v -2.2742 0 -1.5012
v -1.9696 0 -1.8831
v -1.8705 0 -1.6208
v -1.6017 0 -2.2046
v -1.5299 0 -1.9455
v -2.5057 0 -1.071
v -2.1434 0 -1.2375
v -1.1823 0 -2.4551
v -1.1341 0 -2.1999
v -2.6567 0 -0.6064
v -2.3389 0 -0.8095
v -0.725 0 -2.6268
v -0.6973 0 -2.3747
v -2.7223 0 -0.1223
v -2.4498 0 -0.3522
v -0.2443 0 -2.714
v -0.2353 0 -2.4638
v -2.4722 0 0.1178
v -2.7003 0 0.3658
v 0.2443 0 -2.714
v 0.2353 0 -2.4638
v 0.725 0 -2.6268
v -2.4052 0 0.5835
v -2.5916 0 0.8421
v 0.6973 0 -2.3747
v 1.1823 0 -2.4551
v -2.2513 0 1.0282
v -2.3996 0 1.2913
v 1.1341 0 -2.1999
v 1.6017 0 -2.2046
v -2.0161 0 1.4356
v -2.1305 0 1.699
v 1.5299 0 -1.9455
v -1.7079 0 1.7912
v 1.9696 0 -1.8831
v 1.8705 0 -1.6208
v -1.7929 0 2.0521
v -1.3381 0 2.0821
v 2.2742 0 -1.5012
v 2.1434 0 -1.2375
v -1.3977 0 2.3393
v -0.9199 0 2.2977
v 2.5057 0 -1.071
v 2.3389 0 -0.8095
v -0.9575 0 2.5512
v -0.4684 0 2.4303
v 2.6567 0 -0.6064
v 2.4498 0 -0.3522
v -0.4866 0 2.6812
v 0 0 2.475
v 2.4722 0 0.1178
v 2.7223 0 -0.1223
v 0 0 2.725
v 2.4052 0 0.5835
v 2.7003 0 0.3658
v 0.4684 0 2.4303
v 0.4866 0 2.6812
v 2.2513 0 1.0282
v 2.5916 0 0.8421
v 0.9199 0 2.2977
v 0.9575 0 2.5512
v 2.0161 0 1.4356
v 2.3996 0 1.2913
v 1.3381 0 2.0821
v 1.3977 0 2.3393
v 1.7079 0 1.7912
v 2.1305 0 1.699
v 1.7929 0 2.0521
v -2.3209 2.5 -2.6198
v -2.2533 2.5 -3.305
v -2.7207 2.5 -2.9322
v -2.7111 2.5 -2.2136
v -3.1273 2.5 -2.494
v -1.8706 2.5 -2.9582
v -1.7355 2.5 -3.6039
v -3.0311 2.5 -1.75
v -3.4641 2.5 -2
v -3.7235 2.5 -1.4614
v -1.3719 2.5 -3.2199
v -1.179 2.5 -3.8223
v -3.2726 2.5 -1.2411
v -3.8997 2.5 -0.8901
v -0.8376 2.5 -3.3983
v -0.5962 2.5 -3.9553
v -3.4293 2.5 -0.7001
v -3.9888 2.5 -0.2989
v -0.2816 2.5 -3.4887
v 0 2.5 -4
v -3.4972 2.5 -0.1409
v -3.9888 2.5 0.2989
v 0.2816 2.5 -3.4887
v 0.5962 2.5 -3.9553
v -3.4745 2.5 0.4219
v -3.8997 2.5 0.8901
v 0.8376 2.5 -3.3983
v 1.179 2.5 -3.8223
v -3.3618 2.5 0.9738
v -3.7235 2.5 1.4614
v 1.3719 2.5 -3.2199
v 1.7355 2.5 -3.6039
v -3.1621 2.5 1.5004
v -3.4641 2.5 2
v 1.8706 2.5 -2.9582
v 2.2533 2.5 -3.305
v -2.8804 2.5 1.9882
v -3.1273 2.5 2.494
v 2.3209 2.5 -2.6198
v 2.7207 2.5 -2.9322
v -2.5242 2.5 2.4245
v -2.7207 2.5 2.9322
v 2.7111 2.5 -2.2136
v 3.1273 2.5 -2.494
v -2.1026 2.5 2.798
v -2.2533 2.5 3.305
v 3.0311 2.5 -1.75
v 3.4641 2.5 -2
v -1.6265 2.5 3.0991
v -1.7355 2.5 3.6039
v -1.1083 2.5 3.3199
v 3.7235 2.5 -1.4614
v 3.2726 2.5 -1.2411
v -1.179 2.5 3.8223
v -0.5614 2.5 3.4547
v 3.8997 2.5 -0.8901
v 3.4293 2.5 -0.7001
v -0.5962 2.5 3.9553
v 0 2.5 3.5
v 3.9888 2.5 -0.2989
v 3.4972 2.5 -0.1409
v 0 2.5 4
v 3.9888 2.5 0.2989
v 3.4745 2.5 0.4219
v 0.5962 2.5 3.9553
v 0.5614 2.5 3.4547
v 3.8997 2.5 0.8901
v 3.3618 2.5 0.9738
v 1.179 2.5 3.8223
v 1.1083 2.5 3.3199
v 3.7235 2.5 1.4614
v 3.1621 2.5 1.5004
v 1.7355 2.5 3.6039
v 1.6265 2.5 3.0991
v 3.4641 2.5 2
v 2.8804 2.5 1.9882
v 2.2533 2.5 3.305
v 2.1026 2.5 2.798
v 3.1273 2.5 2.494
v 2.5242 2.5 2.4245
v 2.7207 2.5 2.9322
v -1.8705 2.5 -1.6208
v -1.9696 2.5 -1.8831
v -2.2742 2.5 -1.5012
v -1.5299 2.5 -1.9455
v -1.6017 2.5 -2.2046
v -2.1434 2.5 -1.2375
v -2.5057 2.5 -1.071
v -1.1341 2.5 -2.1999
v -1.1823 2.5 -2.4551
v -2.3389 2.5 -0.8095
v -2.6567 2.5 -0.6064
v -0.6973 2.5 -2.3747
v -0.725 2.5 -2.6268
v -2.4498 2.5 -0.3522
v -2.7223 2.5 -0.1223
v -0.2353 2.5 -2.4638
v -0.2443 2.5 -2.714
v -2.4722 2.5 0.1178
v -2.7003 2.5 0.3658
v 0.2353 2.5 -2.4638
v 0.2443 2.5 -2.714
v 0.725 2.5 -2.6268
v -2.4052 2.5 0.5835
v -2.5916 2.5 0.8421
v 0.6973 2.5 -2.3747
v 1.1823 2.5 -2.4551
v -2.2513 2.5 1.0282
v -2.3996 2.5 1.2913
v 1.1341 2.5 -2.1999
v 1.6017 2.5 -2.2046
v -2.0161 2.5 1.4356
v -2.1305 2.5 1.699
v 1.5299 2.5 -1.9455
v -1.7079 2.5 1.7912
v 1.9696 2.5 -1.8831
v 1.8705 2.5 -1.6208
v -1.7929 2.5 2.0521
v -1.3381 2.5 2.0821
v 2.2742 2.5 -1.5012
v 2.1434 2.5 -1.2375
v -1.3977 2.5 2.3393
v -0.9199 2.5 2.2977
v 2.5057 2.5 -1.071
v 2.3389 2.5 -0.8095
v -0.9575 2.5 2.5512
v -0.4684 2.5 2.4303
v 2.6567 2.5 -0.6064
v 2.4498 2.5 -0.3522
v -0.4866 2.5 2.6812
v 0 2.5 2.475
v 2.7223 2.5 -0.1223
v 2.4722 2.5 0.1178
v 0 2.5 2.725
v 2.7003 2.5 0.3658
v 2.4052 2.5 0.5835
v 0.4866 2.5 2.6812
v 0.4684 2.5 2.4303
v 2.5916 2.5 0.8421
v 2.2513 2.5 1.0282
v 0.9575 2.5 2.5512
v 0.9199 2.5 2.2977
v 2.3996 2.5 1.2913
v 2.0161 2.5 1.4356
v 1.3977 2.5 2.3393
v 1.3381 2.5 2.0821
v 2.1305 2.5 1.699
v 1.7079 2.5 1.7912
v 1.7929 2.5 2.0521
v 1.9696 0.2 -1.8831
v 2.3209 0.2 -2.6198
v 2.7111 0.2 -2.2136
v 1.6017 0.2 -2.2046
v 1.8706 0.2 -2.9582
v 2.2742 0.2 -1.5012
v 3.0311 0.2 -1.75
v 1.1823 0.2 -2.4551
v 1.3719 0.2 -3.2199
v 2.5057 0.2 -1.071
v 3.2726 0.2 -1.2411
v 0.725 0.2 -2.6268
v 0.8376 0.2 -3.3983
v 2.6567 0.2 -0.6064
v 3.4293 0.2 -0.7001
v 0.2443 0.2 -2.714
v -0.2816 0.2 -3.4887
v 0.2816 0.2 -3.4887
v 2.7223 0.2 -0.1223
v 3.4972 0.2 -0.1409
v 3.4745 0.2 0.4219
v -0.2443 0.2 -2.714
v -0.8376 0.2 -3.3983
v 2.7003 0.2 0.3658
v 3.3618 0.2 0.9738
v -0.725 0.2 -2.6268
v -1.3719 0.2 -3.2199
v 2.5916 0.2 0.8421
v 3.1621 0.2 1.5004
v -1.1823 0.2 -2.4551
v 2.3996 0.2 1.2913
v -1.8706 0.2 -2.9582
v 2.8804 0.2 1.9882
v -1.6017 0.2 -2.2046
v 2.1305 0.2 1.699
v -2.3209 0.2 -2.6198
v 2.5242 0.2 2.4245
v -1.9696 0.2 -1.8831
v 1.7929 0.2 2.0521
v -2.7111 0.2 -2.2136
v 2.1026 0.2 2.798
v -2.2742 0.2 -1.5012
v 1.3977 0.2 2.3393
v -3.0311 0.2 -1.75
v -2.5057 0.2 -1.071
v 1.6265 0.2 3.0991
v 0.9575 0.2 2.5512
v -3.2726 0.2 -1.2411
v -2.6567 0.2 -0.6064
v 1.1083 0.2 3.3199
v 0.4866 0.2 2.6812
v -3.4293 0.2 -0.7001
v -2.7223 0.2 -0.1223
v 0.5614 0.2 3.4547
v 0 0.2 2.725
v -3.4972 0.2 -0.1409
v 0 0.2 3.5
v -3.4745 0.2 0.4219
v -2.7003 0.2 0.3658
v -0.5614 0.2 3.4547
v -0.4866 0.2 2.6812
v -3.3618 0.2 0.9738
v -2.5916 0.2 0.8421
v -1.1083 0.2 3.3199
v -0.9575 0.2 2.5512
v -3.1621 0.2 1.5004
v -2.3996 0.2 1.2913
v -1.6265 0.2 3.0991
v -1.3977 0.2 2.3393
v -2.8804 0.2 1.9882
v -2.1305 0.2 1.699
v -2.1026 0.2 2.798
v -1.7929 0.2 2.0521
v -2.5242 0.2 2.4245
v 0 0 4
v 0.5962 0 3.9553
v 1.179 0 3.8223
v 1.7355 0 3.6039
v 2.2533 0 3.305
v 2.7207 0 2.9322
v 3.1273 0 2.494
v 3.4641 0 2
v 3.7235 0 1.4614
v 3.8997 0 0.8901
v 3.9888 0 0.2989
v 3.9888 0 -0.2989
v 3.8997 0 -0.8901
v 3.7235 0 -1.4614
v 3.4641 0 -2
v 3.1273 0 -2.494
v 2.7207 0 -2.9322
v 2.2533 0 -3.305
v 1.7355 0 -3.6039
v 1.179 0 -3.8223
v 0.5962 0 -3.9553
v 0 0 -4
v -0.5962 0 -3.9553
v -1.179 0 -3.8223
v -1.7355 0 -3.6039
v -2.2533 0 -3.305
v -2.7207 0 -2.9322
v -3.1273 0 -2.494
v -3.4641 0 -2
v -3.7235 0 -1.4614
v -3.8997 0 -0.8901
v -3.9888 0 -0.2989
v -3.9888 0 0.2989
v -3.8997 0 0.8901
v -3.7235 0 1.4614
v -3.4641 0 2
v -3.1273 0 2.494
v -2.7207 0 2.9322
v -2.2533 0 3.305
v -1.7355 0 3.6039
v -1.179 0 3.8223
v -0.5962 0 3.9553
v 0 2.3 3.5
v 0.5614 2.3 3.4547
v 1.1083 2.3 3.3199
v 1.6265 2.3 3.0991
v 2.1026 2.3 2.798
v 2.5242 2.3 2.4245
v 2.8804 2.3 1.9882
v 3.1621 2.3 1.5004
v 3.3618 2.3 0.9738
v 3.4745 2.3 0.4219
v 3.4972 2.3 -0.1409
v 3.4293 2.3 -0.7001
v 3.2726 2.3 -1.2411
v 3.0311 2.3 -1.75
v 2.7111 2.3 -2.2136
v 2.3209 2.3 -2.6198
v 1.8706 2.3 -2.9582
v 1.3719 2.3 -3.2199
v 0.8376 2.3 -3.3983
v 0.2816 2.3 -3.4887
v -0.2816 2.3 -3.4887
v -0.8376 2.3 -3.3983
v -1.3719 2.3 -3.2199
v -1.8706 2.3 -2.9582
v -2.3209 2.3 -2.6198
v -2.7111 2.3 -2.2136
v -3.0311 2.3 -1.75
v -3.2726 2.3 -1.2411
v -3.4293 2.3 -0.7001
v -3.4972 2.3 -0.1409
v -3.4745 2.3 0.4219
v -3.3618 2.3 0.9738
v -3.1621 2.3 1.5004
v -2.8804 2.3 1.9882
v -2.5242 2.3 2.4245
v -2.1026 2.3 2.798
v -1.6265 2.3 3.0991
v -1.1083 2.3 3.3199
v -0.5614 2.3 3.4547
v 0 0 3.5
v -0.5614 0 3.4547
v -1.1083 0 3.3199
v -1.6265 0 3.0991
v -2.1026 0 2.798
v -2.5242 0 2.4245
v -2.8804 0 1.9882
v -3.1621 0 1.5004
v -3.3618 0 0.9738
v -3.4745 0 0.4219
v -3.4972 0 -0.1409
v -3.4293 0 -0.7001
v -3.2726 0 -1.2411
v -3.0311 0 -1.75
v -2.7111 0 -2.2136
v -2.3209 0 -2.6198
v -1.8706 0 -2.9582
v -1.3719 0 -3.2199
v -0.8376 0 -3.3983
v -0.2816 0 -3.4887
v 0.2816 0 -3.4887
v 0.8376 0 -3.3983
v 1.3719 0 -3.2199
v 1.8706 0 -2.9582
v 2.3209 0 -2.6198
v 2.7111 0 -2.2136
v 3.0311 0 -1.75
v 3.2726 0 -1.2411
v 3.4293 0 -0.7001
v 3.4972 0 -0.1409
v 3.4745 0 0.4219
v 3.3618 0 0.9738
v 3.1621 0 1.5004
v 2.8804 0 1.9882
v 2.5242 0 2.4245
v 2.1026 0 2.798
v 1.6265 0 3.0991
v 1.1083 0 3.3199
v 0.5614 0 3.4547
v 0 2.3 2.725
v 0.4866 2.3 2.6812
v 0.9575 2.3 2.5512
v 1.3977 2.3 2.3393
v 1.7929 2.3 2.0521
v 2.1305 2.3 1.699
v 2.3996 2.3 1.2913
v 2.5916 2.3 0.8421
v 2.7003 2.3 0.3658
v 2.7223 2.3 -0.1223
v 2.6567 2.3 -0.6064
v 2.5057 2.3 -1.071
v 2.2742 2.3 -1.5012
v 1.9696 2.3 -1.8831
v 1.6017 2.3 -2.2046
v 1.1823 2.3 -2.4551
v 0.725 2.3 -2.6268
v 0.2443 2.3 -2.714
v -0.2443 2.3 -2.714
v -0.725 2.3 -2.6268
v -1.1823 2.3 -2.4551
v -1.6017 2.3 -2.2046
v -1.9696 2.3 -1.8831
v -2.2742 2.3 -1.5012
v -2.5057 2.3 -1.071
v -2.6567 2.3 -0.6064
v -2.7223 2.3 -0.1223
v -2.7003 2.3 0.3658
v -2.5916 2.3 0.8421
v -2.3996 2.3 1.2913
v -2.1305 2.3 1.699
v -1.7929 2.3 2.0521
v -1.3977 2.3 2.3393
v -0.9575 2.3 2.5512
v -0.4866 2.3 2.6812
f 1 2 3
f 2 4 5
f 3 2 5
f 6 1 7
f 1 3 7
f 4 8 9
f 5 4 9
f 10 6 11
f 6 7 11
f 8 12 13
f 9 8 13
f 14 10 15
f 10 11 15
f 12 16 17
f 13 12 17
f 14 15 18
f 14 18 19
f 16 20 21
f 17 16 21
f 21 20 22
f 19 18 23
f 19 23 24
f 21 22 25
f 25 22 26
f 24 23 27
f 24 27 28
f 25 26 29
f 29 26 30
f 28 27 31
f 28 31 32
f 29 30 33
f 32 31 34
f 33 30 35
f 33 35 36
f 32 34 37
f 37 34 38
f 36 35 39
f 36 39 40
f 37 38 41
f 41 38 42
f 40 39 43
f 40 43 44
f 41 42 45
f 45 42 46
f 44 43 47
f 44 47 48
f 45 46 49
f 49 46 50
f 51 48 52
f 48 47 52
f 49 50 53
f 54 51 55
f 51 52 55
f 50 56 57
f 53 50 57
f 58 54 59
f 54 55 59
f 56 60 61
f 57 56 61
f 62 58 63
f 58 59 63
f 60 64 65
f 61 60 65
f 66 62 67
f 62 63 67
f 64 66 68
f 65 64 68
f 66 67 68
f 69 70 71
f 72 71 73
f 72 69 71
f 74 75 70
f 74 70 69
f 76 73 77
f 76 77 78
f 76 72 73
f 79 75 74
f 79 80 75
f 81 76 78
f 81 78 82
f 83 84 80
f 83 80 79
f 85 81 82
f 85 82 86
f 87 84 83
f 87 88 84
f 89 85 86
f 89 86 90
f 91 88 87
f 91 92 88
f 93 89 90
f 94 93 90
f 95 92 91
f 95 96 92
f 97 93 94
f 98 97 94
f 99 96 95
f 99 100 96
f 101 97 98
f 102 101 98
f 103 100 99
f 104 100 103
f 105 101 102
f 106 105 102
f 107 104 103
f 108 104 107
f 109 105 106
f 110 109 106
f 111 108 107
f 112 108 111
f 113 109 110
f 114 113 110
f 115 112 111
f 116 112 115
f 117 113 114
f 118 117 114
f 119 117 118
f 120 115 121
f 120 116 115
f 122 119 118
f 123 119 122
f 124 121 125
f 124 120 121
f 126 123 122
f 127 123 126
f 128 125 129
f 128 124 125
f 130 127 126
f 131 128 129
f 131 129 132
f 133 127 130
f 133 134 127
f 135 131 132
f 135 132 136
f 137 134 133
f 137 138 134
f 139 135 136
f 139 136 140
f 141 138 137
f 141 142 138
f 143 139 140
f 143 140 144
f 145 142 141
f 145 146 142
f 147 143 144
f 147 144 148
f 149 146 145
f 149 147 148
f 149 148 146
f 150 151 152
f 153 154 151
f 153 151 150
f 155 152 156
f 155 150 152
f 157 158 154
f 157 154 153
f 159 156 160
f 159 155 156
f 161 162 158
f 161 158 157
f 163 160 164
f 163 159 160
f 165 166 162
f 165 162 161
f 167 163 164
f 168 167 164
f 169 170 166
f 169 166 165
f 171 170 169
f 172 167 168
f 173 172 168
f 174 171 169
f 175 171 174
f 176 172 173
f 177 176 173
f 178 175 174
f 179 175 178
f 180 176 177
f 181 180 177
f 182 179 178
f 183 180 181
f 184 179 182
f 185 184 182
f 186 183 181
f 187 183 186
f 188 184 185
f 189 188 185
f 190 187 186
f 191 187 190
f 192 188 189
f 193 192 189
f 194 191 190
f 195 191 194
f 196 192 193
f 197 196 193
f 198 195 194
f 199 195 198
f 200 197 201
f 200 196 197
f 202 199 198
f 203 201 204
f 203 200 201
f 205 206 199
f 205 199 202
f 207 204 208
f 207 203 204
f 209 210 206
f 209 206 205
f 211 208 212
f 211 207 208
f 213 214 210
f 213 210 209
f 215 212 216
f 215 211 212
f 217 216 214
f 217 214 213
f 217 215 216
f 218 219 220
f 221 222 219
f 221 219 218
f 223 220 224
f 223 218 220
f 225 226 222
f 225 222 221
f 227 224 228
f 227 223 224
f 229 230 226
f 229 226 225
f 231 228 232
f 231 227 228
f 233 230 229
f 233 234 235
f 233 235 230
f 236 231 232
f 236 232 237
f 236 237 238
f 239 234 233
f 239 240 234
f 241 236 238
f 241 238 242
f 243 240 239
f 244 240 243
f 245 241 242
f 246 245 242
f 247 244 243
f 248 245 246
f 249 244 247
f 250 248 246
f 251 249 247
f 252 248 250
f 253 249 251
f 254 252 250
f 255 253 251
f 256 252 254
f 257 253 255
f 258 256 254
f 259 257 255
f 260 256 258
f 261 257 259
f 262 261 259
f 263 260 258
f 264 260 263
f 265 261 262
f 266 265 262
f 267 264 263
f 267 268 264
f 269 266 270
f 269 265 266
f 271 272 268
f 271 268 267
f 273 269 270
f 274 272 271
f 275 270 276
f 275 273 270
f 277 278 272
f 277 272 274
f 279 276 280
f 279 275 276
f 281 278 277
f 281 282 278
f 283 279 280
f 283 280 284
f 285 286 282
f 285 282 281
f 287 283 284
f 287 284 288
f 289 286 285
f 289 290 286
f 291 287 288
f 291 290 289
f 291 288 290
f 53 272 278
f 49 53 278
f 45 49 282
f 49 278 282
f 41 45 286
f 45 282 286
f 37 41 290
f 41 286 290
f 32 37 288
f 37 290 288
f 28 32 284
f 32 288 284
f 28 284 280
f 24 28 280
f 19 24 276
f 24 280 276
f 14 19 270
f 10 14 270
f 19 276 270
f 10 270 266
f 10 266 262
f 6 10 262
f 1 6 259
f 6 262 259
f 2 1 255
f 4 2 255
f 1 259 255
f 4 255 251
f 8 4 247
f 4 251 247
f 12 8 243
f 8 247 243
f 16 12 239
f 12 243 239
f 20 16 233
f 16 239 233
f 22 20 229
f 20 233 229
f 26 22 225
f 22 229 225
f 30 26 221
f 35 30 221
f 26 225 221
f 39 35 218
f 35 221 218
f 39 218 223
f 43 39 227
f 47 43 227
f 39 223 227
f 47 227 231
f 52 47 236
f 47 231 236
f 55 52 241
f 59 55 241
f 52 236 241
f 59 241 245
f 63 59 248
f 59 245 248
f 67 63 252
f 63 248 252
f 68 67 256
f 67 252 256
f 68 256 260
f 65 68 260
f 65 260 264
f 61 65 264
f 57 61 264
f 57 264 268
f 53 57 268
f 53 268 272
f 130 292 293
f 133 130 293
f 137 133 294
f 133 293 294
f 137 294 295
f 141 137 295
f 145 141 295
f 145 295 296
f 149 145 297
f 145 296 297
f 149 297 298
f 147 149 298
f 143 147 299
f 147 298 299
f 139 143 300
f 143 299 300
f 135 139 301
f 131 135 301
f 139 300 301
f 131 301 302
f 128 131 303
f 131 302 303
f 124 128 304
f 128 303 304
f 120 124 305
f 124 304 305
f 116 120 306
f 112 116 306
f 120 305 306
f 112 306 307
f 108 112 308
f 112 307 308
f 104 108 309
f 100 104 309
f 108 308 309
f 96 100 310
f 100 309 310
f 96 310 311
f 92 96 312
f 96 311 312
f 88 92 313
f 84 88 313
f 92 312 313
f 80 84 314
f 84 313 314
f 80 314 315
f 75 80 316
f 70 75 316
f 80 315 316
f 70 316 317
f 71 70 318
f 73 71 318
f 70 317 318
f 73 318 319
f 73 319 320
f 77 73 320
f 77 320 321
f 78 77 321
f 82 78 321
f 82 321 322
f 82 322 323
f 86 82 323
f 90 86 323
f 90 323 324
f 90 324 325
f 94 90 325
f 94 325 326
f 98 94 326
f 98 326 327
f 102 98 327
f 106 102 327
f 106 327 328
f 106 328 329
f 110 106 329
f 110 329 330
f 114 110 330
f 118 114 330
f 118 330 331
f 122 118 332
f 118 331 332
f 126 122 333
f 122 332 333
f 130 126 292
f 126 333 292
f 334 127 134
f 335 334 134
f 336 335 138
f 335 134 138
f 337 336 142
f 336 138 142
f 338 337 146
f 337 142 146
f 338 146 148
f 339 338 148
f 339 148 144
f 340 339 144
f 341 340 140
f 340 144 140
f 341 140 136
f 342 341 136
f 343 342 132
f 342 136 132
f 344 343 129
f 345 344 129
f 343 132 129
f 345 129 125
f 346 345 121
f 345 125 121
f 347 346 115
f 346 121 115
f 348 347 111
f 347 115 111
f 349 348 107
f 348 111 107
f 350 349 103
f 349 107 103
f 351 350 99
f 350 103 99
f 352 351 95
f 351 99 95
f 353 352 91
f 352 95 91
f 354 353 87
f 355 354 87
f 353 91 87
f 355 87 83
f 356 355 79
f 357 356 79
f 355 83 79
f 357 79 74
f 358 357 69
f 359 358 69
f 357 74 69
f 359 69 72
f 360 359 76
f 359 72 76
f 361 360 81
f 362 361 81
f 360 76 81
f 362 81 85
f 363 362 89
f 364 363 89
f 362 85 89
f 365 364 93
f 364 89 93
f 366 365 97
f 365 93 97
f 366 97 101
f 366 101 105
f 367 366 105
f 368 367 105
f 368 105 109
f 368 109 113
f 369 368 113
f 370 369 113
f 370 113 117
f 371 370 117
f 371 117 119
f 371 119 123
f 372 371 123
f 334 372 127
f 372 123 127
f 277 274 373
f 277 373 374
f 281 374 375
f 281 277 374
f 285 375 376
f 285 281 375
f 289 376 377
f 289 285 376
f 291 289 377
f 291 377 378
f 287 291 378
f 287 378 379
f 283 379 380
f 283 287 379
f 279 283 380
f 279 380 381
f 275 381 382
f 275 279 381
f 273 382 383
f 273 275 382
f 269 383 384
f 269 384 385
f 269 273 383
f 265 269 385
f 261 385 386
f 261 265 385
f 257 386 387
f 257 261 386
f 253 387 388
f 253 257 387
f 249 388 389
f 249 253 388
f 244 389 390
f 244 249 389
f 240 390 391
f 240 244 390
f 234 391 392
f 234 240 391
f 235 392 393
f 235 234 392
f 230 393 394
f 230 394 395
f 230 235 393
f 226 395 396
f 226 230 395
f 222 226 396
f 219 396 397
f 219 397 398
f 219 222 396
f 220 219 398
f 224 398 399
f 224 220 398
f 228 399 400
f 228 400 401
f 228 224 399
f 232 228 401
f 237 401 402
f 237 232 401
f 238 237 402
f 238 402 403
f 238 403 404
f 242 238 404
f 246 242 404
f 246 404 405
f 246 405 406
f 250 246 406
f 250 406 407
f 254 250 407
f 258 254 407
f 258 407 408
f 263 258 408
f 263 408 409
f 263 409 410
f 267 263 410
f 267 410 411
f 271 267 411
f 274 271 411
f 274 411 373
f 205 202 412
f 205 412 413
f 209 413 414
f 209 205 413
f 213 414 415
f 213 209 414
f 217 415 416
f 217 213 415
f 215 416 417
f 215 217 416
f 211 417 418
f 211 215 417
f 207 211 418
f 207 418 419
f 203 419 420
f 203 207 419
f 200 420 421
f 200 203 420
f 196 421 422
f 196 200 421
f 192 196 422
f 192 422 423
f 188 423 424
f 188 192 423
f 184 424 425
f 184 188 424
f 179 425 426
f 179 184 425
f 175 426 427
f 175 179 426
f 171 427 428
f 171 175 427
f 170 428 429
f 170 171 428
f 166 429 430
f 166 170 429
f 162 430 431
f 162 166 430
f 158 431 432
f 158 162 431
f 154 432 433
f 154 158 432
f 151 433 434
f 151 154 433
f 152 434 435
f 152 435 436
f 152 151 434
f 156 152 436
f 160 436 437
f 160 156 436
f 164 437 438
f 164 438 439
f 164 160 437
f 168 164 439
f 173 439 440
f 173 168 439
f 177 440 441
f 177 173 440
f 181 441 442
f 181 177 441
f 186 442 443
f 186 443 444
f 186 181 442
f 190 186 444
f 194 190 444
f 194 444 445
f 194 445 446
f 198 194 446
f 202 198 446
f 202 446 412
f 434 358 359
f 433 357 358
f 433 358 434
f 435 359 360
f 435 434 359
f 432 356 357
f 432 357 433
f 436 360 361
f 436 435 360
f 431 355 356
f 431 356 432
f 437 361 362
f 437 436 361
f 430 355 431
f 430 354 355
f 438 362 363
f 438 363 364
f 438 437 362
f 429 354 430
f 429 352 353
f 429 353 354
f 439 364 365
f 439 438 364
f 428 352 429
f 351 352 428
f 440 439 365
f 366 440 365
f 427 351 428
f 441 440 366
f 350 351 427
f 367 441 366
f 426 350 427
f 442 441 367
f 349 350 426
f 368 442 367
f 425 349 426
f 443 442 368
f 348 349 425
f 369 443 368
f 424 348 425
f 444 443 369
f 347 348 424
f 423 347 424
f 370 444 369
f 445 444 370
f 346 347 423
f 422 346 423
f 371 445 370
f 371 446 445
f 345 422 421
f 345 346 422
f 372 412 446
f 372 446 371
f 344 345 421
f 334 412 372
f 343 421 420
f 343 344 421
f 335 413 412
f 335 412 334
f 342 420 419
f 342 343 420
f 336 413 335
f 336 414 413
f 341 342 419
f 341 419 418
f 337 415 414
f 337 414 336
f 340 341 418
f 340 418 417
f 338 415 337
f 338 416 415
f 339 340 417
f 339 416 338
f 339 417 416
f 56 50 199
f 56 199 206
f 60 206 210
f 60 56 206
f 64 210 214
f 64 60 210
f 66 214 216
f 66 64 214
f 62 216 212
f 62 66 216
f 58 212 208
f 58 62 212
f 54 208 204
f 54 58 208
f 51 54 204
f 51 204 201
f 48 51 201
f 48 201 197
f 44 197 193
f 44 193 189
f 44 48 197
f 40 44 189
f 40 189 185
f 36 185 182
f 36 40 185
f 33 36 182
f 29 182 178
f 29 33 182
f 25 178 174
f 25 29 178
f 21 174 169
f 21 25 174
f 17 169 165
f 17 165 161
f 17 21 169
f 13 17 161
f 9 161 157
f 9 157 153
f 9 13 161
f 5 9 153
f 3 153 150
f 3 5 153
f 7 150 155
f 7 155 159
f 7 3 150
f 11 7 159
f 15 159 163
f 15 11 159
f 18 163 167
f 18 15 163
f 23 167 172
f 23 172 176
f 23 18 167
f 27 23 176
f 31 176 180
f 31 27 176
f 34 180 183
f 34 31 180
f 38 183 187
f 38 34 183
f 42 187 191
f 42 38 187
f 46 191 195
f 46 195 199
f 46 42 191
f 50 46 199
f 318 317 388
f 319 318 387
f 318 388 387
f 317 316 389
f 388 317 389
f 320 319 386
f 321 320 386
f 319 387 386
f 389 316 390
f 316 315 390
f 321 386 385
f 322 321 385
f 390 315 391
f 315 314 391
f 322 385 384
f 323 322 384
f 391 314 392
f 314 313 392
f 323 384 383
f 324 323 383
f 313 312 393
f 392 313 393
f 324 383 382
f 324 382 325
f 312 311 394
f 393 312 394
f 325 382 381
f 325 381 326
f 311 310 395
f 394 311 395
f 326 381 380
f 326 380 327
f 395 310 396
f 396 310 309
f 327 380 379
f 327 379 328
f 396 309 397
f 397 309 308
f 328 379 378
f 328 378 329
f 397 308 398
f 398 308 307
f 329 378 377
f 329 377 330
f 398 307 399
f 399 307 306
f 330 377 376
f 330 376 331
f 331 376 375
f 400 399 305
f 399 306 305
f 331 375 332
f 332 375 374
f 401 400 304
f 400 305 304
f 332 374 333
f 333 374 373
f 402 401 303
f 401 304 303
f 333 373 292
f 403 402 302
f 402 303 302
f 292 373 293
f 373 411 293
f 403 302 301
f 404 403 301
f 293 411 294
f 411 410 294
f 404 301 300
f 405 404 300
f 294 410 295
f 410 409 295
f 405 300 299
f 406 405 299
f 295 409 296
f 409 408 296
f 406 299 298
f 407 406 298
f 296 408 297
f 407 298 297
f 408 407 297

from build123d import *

# Parameters (mm, degrees)
SKETCH_1_R          = 4
SKETCH_1_R_2        = 2.475
EXTRUDE_1_DEPTH     = 2.5
SKETCH_2_R          = 3.5
SKETCH_2_R_2        = 3.2
SKETCH_2_R_3        = 2.725
CUT_EXTRUDE_1_DEPTH = 0.2
CUT_EXTRUDE_START   = -0.2
SKETCH_3_R          = 3.5
SKETCH_3_R_2        = 2.725
CUT_EXTRUDE_2_DEPTH = 0.2


with BuildPart() as part:
    # Эскиз1 → Бобышка-Вытянуть1 (new body)
    with BuildSketch(Plane(origin=(0, 0, 0), x_dir=(1, 0, 0), z_dir=(0, 1, 0))):
        with Locations(Location((0, 0, 0), (0, 0, 270))):
            Circle(SKETCH_1_R)
        with Locations(Location((0, 0, 0), (0, 0, 270))):
            Circle(SKETCH_1_R_2, mode=Mode.SUBTRACT)
    extrude(amount=EXTRUDE_1_DEPTH)

    # Эскиз2 → Вырез-Вытянуть1 (cut)
    # profile 1 of 2: a face of its own
    with BuildSketch(Plane(origin=(0, 2.5, 0), x_dir=(1, 0, 0), z_dir=(0, 1, 0))):
        with Locations(Location((0, 0, 0), (0, 0, 270))):
            Circle(SKETCH_2_R)
        Circle(SKETCH_2_R_2, mode=Mode.SUBTRACT)
    # profile 2 of 2: a face of its own
    with BuildSketch(Plane(origin=(0, 2.5, 0), x_dir=(1, 0, 0), z_dir=(0, 1, 0))):
        Circle(SKETCH_2_R_2)
        with Locations(Location((0, 0, 0), (0, 0, 270))):
            Circle(SKETCH_2_R_3, mode=Mode.SUBTRACT)
    extrude(amount=-CUT_EXTRUDE_1_DEPTH, mode=Mode.SUBTRACT)

    # Эскиз3 → Вырез-Вытянуть2 (cut)
    with BuildSketch(Plane.XZ.offset(CUT_EXTRUDE_START)):
        with Locations(Location((0, 0, 0), (0, 0, 90))):
            Circle(SKETCH_3_R)
        with Locations(Location((0, 0, 0), (0, 0, 90))):
            Circle(SKETCH_3_R_2, mode=Mode.SUBTRACT)
    extrude(amount=CUT_EXTRUDE_2_DEPTH, mode=Mode.SUBTRACT)


solid = part.part
